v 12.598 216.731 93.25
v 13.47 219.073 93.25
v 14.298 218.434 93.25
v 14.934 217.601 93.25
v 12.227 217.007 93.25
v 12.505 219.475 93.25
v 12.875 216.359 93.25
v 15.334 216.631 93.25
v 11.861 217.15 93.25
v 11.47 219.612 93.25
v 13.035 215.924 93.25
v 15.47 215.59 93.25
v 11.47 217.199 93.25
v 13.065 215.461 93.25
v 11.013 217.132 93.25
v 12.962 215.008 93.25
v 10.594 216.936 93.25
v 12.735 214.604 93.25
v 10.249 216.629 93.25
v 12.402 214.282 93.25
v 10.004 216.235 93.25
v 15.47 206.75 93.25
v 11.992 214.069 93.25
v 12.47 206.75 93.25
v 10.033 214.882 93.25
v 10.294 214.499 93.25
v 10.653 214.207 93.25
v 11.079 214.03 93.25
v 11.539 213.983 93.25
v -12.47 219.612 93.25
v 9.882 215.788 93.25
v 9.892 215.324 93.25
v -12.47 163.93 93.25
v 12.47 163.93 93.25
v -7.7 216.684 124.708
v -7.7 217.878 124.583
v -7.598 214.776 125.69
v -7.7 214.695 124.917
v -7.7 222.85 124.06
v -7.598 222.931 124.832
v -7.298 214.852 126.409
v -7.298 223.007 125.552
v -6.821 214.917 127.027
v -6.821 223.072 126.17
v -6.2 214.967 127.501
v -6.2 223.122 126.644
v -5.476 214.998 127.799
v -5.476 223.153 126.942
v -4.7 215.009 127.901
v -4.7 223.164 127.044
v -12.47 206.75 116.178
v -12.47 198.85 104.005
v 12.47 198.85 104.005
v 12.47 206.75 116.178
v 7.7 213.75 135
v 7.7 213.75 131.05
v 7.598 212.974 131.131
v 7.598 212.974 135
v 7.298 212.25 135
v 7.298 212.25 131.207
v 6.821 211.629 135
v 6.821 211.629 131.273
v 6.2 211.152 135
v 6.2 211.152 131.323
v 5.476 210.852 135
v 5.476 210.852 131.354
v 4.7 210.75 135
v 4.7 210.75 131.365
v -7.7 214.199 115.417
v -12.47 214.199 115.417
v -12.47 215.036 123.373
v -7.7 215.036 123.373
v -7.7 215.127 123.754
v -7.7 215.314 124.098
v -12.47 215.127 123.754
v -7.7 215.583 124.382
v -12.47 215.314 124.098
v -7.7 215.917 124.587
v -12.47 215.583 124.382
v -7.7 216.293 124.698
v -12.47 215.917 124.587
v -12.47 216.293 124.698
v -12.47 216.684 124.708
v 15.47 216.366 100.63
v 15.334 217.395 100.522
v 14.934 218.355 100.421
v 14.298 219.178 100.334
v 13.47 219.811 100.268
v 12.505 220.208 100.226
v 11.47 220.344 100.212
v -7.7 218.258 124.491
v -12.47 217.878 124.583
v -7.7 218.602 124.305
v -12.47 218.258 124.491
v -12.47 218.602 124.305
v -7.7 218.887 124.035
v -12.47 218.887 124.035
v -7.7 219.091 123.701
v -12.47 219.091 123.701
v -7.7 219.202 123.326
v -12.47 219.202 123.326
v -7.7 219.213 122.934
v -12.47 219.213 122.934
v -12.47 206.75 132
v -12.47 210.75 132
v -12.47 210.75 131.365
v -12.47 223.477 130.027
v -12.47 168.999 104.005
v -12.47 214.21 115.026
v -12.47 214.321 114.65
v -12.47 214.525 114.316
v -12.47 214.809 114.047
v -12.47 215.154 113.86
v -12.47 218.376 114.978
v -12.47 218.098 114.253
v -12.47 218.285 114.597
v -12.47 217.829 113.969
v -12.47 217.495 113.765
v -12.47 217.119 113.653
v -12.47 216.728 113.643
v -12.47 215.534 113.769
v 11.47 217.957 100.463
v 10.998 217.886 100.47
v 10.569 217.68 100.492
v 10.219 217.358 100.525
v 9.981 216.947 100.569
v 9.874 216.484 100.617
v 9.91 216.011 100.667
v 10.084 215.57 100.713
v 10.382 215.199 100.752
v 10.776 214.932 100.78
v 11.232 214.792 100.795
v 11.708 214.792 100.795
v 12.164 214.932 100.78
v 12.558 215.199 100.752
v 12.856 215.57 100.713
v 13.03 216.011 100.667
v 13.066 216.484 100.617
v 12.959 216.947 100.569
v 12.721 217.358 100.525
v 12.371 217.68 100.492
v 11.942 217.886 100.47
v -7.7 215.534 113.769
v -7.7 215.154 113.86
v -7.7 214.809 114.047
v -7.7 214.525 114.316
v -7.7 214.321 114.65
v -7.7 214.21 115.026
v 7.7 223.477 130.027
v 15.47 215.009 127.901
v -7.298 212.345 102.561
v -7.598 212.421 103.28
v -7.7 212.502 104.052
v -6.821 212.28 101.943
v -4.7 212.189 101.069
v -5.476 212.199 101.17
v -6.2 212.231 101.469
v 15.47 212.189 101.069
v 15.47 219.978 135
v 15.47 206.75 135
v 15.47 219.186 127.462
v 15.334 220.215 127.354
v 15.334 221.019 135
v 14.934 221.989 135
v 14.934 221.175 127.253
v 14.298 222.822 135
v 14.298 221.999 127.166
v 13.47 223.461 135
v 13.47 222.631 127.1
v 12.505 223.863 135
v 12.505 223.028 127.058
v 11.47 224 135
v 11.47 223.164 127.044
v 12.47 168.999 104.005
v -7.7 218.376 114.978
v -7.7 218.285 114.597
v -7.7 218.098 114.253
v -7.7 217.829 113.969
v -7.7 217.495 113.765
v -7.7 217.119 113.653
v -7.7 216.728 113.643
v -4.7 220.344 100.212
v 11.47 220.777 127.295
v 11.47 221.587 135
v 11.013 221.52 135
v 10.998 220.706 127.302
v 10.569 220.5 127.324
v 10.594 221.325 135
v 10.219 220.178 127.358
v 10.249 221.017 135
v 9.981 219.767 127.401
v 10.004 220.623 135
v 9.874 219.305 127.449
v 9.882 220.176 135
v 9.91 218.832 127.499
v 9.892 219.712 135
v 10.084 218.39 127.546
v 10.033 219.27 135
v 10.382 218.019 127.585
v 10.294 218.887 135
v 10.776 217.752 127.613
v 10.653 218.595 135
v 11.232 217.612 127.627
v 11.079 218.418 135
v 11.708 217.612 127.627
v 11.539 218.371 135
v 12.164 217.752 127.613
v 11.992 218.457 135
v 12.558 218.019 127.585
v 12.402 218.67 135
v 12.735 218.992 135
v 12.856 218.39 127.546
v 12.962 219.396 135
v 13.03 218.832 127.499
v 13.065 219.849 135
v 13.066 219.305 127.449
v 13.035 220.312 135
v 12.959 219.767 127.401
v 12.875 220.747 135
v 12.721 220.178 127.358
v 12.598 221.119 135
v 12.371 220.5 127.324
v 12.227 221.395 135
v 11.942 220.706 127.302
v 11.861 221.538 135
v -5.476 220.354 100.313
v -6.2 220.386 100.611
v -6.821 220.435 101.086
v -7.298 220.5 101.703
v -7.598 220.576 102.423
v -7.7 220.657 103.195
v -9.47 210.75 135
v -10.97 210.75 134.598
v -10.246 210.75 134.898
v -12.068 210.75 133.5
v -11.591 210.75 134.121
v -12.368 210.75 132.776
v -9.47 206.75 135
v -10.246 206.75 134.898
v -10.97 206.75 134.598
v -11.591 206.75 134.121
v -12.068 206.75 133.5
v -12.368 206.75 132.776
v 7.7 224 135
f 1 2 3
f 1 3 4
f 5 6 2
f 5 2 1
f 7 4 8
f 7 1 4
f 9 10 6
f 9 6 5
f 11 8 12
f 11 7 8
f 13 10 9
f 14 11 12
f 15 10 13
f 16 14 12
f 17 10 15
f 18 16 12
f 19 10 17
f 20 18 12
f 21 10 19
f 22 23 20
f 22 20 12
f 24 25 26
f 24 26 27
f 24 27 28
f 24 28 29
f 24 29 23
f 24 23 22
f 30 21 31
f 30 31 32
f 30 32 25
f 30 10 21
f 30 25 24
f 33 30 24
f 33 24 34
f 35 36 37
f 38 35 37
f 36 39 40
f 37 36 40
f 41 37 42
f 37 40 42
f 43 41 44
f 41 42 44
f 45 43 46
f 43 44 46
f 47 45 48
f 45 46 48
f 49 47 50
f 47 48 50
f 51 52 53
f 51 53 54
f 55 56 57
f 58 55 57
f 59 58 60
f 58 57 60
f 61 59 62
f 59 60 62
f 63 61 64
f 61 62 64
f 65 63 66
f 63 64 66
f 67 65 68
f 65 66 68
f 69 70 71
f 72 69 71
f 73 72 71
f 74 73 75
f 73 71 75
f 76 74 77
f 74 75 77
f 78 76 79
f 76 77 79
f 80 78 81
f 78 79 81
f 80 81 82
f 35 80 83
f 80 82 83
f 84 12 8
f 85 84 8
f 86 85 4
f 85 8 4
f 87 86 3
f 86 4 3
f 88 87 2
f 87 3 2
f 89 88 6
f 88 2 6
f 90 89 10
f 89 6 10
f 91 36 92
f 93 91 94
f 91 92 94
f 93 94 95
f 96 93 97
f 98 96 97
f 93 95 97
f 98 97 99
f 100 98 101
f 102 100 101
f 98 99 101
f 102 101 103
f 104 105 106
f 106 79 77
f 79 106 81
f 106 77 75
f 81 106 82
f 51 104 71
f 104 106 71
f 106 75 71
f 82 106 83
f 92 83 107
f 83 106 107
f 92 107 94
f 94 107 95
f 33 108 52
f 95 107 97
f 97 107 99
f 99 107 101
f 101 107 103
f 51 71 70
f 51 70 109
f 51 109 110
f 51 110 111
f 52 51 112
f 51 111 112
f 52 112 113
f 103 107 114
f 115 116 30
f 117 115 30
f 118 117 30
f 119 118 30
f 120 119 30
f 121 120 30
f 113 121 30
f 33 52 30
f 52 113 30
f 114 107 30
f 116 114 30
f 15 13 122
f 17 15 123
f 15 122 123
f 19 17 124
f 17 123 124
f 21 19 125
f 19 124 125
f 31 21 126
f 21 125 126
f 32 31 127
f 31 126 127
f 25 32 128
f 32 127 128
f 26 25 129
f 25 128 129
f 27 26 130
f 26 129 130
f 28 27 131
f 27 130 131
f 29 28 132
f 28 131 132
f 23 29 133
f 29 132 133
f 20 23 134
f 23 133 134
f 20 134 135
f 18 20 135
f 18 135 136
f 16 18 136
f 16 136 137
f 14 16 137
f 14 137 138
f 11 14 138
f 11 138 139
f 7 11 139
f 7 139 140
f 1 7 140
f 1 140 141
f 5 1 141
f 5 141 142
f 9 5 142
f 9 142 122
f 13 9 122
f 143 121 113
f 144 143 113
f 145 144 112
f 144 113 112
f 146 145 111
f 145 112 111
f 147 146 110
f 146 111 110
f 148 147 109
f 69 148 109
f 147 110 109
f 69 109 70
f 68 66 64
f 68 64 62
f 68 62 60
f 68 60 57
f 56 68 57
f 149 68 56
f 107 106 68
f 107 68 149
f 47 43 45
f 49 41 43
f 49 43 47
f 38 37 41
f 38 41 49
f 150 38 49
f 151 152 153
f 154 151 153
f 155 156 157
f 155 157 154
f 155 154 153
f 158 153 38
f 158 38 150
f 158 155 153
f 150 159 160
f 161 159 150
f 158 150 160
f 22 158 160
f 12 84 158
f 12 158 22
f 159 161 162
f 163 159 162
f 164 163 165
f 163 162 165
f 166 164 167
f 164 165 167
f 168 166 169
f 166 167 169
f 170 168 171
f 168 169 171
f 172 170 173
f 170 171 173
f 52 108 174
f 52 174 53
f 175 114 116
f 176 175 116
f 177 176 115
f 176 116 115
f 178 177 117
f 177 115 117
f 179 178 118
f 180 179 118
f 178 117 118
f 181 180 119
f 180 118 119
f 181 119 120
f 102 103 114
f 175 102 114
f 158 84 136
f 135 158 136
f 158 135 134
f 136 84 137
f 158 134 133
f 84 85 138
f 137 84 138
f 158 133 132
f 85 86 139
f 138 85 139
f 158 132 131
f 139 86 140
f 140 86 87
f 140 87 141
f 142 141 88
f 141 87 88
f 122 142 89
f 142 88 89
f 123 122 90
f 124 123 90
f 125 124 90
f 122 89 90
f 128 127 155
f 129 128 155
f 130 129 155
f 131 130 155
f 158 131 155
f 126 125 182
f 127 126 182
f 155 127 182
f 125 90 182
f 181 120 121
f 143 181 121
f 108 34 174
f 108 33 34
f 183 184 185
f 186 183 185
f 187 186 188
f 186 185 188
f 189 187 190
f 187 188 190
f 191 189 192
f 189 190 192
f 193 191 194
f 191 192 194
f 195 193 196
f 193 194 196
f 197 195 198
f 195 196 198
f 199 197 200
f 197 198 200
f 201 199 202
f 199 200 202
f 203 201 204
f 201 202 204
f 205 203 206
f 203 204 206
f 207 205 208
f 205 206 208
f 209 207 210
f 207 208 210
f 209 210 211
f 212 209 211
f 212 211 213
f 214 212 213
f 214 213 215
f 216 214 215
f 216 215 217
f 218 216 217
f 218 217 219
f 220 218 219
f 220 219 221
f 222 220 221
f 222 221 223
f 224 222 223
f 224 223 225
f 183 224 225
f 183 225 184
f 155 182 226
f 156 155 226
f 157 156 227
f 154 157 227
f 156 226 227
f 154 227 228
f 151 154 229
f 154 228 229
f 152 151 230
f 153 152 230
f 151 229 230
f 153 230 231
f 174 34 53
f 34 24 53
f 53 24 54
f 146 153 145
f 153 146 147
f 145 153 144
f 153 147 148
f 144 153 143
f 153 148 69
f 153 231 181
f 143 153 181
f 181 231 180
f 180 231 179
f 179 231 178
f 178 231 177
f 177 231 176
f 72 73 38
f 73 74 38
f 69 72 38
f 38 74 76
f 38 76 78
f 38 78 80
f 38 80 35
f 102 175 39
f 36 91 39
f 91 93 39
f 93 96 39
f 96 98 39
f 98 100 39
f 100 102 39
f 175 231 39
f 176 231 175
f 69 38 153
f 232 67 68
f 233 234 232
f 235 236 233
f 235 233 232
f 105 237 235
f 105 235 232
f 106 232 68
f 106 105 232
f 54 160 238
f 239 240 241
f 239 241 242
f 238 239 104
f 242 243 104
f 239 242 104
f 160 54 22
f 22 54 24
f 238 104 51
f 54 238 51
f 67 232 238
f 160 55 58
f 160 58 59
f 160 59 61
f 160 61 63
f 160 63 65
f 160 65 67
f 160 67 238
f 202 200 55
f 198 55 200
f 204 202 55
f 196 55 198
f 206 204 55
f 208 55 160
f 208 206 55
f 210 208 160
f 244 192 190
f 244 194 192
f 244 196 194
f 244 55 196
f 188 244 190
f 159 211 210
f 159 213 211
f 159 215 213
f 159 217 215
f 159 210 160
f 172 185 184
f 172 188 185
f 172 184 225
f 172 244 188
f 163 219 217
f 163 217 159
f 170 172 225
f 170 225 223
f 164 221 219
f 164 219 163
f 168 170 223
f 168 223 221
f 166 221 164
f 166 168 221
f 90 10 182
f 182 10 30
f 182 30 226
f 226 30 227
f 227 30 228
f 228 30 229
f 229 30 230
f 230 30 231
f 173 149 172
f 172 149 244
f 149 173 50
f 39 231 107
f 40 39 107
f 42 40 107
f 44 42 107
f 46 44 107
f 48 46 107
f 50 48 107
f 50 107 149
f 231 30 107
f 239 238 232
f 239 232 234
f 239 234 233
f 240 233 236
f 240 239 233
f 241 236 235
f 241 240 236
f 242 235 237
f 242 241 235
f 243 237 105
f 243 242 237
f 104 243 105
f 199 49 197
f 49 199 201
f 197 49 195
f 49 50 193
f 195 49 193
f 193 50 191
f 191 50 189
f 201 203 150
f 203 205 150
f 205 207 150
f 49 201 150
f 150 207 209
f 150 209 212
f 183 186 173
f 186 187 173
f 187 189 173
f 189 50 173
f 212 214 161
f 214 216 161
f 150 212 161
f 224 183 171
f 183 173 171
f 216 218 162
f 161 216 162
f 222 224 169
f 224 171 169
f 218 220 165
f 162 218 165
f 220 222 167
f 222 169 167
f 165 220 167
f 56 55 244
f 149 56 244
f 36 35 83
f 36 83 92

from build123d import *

# Parameters (mm, degrees)
EXTRUDE_START         = -12.47
EXTRUDE_1_DEPTH       = 23.94
EXTRUDE_START_2       = -42.420417041
EXTRUDE_3_DEPTH       = 42.420417041
EXTRUDE_START_3       = 135
EXTRUDE_3_2_OUTLINE_W = 5.53
EXTRUDE_3_2_OUTLINE_H = 12
EXTRUDE_3_2_DEPTH     = 1
EXTRUDE_START_4       = 92.811966442
EXTRUDE_3_3_OUTLINE_W = 5.53
EXTRUDE_3_3_OUTLINE_H = 12
EXTRUDE_3_3_DEPTH     = 0.418113953
SKETCH_3_W            = 8.92360814
SKETCH_3_H            = 8.098758973
CUT_EXTRUDE_1_DEPTH   = 24.94
EXTRUDE_4_DEPTH       = 4
EXTRUDE_5_DEPTH       = 1
FILLET_1_R            = 3
CUT_EXTRUDE_START     = -12.47
CUT_EXTRUDE_4_DEPTH   = 20.17
CUT_EXTRUDE_START_2   = 130.027390523
CUT_EXTRUDE_4_2_DEPTH = 4.972609477
CUT_EXTRUDE_5_REACH   = 78.971
SKETCH_6_R            = 1.6
CUT_EXTRUDE_6_DEPTH   = 8.2
CUT_EXTRUDE_8_DEPTH   = 10


with BuildPart() as part:
    # 草图1 → 凸台-拉伸1 (new body)
    with BuildSketch(Plane(origin=(0, 0, 0), x_dir=(0, 0, -1), z_dir=(1, 0, 0)).offset(EXTRUDE_START)):
        Polygon((-135, 224), (-135, 206.75), (-116.178095192, 206.75), (-104.005, 198.85), (-104.005, 168.99910251), (-93.25, 163.930391323), (-93.25, 219.611898178), align=None)
    extrude(amount=EXTRUDE_1_DEPTH)

    # 凸台-拉伸3: read off the stored shape, not the designer's step
    # 凸台-拉伸3 outline → 凸台-拉伸3 (add)
    with BuildSketch(Plane(origin=(11.47, 224, 135), x_dir=(1, 0, 0), z_dir=(0, 0.10452846326765014, 0.9945218953682736)).offset(EXTRUDE_START_2)):
        with BuildLine():
            Line((0, 0), (0, -4))
            Line((0, -4), (4, -4))
            ThreePointArc((4, -4), (2.828427125, -1.171572875), (0, 0))
        make_face()
    extrude(amount=EXTRUDE_3_DEPTH)

    # Extrude 3 2 outline → Extrude 3 2 (cut)
    with BuildSketch(Plane.XY.offset(EXTRUDE_START_3)):
        with Locations((14.235, 220)):
            Rectangle(EXTRUDE_3_2_OUTLINE_W, EXTRUDE_3_2_OUTLINE_H)
    extrude(amount=EXTRUDE_3_2_DEPTH, mode=Mode.SUBTRACT)

    # Extrude 3 3 outline → Extrude 3 3 (cut)
    with BuildSketch(Plane.XY.offset(EXTRUDE_START_4)):
        with Locations((14.235, 220)):
            Rectangle(EXTRUDE_3_3_OUTLINE_W, EXTRUDE_3_3_OUTLINE_H)
    extrude(amount=EXTRUDE_3_3_DEPTH, mode=Mode.SUBTRACT)

    # 草图3 → 切除-拉伸1 (cut)
    with BuildSketch(Plane(origin=(0, 0, 93.25), x_dir=(-1, 0, 0), z_dir=(0, 0, -1))):
        with Locations((-14.443820209, 216.390986059)):
            Rectangle(SKETCH_3_W, SKETCH_3_H)
    extrude(amount=CUT_EXTRUDE_1_DEPTH, mode=Mode.SUBTRACT)

    # 草图4 → 凸台-拉伸4 (add)
    with BuildSketch(Plane(origin=(11.47, 0, 0), x_dir=(0, 0, -1), z_dir=(1, 0, 0))):
        Polygon((-93.25, 206.75), (-93.25, 215.589865059), (-135, 219.977966882), (-135, 206.75), align=None)
    extrude(amount=EXTRUDE_4_DEPTH)

    # 草图10 → 凸台-拉伸5 (add)
    with BuildSketch(Plane(origin=(11.47, 0, 0), x_dir=(0, 0, -1), z_dir=(1, 0, 0))):
        Polygon((-93.25, 163.930391323), (-104.005, 168.99910251), (-104.005, 198.85), (-116.178095192, 206.75), (-93.25, 206.75), align=None)
    extrude(amount=EXTRUDE_5_DEPTH)

    # 圆角1
    fillet_1_edges = [part.edges().sort_by_distance(p)[0] for p in [
        (-12.47, 215.375, 135),
    ]]
    fillet(fillet_1_edges, radius=FILLET_1_R)

    # 切除-拉伸4: read off the stored shape, not the designer's step
    # 切除-拉伸4 outline → 切除-拉伸4 (cut)
    with BuildSketch(Plane.YZ.offset(CUT_EXTRUDE_START)):
        Polygon((210.75, 131.365089719), (223.477357684, 130.027390523), (224, 135), (210.75, 135), align=None)
    extrude(amount=CUT_EXTRUDE_4_DEPTH, mode=Mode.SUBTRACT)

    # Cut-Extrude 4 2 outline → Cut-Extrude 4 2 (add)
    with BuildSketch(Plane.XY.offset(CUT_EXTRUDE_START_2)):
        with BuildLine():
            ThreePointArc((7.7, 213.75), (6.821320344, 211.628679656), (4.7, 210.75))
            Line((4.7, 210.75), (7.7, 210.75))
            Line((7.7, 210.75), (7.7, 213.75))
        make_face()
    extrude(amount=CUT_EXTRUDE_4_2_DEPTH)

    # 切除-拉伸5: up to this plane
    cut_extrude_5_end = Plane(origin=(11.47, 219.611898178, 93.25), z_dir=(0, 0, 1))
    # 草图6 → 切除-拉伸5 (cut, up to the surface)
    with BuildSketch(Plane(origin=(11.47, 224, 135), x_dir=(1, 0, 0), z_dir=(0, 0.10452846326765014, 0.9945218953682736)), mode=Mode.PRIVATE) as cut_extrude_5_sk1:
        with Locations(Location((0, -4, 0), (0, 0, 90))):
            Circle(SKETCH_6_R)
    cut_extrude_5_tool1 = split(extrude(cut_extrude_5_sk1.sketch, amount=-CUT_EXTRUDE_5_REACH, mode=Mode.PRIVATE), bisect_by=cut_extrude_5_end, keep=Keep.BOTH, mode=Mode.PRIVATE)
    add(cut_extrude_5_tool1.solids().sort_by_distance((11.47, 220.021912, 135.418114))[0], mode=Mode.SUBTRACT)

    # 草图7 → 切除-拉伸6 (cut)
    with BuildSketch(Plane(origin=(0, 207.518492152, -21.811072421), x_dir=(1, 0, 0), z_dir=(0, 0.9945218953682738, -0.10452846326765014))):
        with BuildLine():
            Line((15.47, -149.674831647), (15.47, -122.694860975))
            Line((15.47, -122.694860975), (-4.7, -122.694860975))
            ThreePointArc((-4.7, -122.694860975), (-6.821320344, -123.573540631), (-7.7, -125.694860975))
            Line((-7.7, -125.694860975), (-7.7, -146.674831647))
            ThreePointArc((-7.7, -146.674831647), (-6.821320344, -148.79615199), (-4.7, -149.674831647))
            Line((-4.7, -149.674831647), (15.47, -149.674831647))
        make_face()
    extrude(amount=-CUT_EXTRUDE_6_DEPTH, mode=Mode.SUBTRACT)

    # 草图9 → 切除-拉伸8 (cut)
    with BuildSketch(Plane.ZY.offset(12.47)):
        with BuildLine():
            Line((122.934325929, 219.212567575), (114.978150766, 218.376339869))
            ThreePointArc((114.978150766, 218.376339869), (113.969224519, 217.828537613), (113.643160618, 216.727764331))
            Line((113.643160618, 216.727764331), (113.768594774, 215.534338057))
            ThreePointArc((113.768594774, 215.534338057), (114.316397031, 214.52541181), (115.417170312, 214.199347909))
            Line((115.417170312, 214.199347909), (123.373345475, 215.035575615))
            ThreePointArc((123.373345475, 215.035575615), (124.382271722, 215.583377871), (124.708335623, 216.684151153))
            Line((124.708335623, 216.684151153), (124.582901467, 217.877577427))
            ThreePointArc((124.582901467, 217.877577427), (124.035099211, 218.886503674), (122.934325929, 219.212567575))
        make_face()
    extrude(amount=-CUT_EXTRUDE_8_DEPTH, mode=Mode.SUBTRACT)


solid = part.part
